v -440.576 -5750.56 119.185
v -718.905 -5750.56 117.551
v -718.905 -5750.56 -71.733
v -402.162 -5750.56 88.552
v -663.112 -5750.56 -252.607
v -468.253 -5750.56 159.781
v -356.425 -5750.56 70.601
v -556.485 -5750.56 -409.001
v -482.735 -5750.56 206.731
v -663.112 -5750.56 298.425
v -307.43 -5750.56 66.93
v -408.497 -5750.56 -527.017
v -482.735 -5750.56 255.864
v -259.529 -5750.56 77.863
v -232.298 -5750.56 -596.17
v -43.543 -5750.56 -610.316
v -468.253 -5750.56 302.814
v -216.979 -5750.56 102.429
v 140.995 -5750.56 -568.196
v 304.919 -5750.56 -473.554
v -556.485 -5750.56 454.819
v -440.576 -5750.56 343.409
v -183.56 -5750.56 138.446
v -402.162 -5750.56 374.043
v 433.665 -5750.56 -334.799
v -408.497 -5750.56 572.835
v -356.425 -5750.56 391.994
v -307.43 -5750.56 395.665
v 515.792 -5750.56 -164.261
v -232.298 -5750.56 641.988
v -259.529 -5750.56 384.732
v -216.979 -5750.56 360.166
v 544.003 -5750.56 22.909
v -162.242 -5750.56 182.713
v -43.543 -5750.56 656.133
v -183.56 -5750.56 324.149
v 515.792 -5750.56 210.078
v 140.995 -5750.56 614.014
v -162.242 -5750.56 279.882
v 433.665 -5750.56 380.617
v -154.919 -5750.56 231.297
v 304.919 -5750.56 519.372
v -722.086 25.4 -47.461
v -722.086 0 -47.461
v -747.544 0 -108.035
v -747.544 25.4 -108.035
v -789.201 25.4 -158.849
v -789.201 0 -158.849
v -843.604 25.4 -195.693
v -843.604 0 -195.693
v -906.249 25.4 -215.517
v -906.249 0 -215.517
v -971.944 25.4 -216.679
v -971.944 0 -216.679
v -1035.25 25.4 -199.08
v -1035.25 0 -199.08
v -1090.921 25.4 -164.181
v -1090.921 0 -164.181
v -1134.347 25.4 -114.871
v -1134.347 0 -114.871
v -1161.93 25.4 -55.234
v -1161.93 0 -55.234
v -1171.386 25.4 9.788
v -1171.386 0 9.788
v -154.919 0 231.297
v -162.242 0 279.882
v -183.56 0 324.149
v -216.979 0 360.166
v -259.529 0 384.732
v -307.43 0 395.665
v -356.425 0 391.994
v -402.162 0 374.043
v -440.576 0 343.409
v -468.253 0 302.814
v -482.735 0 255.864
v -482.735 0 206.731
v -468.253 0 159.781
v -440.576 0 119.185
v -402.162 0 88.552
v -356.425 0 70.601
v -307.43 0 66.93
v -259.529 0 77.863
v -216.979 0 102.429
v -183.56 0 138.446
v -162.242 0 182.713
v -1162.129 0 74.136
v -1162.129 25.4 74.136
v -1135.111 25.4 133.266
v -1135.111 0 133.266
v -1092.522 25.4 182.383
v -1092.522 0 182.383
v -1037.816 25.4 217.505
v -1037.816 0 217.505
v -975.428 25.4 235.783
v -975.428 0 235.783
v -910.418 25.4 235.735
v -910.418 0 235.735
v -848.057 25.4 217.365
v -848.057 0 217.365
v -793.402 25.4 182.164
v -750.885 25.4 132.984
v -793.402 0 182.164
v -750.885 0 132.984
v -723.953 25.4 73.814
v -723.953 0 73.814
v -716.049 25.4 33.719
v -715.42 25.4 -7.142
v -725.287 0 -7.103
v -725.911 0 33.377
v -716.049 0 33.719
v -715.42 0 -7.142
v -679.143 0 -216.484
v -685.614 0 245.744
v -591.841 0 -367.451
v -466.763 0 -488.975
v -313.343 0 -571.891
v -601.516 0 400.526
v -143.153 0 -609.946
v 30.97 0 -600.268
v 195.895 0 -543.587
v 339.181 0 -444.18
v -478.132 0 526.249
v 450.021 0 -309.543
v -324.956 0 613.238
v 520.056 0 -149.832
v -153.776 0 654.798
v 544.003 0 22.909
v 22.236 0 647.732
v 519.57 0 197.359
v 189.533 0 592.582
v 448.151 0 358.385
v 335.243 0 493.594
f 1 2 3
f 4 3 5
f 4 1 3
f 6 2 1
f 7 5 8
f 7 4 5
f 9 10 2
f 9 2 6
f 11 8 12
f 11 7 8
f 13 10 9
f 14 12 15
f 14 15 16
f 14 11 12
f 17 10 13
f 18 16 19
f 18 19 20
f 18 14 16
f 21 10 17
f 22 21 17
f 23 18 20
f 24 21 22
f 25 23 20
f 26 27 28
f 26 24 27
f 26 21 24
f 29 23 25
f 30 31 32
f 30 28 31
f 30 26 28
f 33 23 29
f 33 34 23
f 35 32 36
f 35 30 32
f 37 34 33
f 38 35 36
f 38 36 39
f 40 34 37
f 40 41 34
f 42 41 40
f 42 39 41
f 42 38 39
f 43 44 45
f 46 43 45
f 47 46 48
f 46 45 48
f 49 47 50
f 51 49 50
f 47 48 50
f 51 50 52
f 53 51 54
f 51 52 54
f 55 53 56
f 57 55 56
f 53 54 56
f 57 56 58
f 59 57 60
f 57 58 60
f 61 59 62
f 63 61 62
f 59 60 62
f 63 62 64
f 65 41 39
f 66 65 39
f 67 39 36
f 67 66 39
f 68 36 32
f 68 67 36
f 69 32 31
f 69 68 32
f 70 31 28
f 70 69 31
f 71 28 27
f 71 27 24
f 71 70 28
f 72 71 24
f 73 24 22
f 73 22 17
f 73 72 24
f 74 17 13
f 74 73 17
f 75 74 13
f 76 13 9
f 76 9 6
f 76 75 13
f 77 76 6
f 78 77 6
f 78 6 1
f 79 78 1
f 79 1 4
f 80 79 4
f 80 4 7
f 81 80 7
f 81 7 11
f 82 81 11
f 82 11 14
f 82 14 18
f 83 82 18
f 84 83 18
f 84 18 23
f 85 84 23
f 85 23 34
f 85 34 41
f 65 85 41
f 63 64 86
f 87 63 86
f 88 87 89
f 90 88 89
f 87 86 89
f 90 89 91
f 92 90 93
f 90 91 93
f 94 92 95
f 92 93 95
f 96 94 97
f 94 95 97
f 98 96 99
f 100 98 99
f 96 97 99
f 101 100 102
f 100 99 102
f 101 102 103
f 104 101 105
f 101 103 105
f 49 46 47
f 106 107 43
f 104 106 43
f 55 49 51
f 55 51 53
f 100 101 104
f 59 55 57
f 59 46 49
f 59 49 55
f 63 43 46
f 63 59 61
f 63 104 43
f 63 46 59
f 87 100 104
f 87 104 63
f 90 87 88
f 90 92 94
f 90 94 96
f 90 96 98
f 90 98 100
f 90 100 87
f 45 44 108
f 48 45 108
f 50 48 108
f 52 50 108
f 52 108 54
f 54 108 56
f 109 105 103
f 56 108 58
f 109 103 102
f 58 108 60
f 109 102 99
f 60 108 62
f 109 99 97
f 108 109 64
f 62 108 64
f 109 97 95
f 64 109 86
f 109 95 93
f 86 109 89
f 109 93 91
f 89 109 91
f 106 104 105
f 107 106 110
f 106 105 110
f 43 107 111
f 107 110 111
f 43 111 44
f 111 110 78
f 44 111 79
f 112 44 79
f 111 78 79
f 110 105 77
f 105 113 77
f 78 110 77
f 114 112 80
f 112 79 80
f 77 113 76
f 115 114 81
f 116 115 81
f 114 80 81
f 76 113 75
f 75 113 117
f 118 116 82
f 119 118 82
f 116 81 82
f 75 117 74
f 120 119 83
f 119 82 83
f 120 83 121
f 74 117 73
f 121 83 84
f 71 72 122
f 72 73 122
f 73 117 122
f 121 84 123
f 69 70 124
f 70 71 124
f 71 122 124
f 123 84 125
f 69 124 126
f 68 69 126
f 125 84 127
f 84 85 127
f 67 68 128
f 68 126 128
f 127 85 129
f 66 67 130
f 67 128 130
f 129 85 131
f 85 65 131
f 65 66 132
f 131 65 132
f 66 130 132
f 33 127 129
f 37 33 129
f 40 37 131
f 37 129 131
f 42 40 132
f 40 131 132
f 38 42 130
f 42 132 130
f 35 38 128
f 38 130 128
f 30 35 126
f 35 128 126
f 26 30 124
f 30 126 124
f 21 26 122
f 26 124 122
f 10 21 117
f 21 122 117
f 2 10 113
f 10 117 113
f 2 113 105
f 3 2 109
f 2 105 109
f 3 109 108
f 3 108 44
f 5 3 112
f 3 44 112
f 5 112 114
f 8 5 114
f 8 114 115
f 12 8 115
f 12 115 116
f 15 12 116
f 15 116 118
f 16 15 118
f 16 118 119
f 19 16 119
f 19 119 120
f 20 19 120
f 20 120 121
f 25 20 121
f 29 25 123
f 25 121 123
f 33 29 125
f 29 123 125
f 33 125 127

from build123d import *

# Parameters (mm, degrees)
F0_R     = 635
F0_R_2   = 164.828669
F1_DEPTH = 5750.56
F3_DEPTH = 25.4
F4_DEPTH = 25.4


with BuildPart() as f1:
    # F0 (on Front) → F1 (new body)
    with BuildSketch(Plane.XZ):
        with Locations((-90.997033, 22.908866)):
            Circle(F0_R)
        with Locations((-319.747567, 231.297463)):
            Circle(F0_R_2, mode=Mode.SUBTRACT)
    extrude(amount=F1_DEPTH)

    # F2 (on face) → F3 (join)
    with BuildSketch(Plane(origin=(0, 0, 0), x_dir=(-1, 0, 0), z_dir=(0, 1, 0))):
        with BuildLine():
            ThreePointArc((725.997033, 22.908866), (725.485896, 48.382032), (723.95331, 73.814188))
            ThreePointArc((723.95331, 73.814188), (714.818339, 13.302789), (722.085819, -47.461187))
            ThreePointArc((722.085819, -47.461187), (725.018475, -12.330466), (725.997033, 22.908866))
        make_face()
        with BuildLine():
            ThreePointArc((722.085819, -47.461187), (971.94435, -216.678506), (1171.385667, 9.787711))
            ThreePointArc((1171.385667, 9.787711), (975.427816, 235.782791), (723.95331, 73.814188))
            ThreePointArc((723.95331, 73.814188), (725.485896, 48.382032), (725.997033, 22.908866))
            ThreePointArc((725.997033, 22.908866), (725.018475, -12.330466), (722.085819, -47.461187))
        make_face()
    extrude(amount=F3_DEPTH)

    # F0 (on Front) → F4 (join)
    with BuildSketch(Plane.XZ):
        with Locations((-90.997033, 22.908866)):
            Circle(F0_R)
        with Locations((-319.747567, 231.297463)):
            Circle(F0_R_2, mode=Mode.SUBTRACT)
    extrude(amount=F4_DEPTH)


solid = f1.part
